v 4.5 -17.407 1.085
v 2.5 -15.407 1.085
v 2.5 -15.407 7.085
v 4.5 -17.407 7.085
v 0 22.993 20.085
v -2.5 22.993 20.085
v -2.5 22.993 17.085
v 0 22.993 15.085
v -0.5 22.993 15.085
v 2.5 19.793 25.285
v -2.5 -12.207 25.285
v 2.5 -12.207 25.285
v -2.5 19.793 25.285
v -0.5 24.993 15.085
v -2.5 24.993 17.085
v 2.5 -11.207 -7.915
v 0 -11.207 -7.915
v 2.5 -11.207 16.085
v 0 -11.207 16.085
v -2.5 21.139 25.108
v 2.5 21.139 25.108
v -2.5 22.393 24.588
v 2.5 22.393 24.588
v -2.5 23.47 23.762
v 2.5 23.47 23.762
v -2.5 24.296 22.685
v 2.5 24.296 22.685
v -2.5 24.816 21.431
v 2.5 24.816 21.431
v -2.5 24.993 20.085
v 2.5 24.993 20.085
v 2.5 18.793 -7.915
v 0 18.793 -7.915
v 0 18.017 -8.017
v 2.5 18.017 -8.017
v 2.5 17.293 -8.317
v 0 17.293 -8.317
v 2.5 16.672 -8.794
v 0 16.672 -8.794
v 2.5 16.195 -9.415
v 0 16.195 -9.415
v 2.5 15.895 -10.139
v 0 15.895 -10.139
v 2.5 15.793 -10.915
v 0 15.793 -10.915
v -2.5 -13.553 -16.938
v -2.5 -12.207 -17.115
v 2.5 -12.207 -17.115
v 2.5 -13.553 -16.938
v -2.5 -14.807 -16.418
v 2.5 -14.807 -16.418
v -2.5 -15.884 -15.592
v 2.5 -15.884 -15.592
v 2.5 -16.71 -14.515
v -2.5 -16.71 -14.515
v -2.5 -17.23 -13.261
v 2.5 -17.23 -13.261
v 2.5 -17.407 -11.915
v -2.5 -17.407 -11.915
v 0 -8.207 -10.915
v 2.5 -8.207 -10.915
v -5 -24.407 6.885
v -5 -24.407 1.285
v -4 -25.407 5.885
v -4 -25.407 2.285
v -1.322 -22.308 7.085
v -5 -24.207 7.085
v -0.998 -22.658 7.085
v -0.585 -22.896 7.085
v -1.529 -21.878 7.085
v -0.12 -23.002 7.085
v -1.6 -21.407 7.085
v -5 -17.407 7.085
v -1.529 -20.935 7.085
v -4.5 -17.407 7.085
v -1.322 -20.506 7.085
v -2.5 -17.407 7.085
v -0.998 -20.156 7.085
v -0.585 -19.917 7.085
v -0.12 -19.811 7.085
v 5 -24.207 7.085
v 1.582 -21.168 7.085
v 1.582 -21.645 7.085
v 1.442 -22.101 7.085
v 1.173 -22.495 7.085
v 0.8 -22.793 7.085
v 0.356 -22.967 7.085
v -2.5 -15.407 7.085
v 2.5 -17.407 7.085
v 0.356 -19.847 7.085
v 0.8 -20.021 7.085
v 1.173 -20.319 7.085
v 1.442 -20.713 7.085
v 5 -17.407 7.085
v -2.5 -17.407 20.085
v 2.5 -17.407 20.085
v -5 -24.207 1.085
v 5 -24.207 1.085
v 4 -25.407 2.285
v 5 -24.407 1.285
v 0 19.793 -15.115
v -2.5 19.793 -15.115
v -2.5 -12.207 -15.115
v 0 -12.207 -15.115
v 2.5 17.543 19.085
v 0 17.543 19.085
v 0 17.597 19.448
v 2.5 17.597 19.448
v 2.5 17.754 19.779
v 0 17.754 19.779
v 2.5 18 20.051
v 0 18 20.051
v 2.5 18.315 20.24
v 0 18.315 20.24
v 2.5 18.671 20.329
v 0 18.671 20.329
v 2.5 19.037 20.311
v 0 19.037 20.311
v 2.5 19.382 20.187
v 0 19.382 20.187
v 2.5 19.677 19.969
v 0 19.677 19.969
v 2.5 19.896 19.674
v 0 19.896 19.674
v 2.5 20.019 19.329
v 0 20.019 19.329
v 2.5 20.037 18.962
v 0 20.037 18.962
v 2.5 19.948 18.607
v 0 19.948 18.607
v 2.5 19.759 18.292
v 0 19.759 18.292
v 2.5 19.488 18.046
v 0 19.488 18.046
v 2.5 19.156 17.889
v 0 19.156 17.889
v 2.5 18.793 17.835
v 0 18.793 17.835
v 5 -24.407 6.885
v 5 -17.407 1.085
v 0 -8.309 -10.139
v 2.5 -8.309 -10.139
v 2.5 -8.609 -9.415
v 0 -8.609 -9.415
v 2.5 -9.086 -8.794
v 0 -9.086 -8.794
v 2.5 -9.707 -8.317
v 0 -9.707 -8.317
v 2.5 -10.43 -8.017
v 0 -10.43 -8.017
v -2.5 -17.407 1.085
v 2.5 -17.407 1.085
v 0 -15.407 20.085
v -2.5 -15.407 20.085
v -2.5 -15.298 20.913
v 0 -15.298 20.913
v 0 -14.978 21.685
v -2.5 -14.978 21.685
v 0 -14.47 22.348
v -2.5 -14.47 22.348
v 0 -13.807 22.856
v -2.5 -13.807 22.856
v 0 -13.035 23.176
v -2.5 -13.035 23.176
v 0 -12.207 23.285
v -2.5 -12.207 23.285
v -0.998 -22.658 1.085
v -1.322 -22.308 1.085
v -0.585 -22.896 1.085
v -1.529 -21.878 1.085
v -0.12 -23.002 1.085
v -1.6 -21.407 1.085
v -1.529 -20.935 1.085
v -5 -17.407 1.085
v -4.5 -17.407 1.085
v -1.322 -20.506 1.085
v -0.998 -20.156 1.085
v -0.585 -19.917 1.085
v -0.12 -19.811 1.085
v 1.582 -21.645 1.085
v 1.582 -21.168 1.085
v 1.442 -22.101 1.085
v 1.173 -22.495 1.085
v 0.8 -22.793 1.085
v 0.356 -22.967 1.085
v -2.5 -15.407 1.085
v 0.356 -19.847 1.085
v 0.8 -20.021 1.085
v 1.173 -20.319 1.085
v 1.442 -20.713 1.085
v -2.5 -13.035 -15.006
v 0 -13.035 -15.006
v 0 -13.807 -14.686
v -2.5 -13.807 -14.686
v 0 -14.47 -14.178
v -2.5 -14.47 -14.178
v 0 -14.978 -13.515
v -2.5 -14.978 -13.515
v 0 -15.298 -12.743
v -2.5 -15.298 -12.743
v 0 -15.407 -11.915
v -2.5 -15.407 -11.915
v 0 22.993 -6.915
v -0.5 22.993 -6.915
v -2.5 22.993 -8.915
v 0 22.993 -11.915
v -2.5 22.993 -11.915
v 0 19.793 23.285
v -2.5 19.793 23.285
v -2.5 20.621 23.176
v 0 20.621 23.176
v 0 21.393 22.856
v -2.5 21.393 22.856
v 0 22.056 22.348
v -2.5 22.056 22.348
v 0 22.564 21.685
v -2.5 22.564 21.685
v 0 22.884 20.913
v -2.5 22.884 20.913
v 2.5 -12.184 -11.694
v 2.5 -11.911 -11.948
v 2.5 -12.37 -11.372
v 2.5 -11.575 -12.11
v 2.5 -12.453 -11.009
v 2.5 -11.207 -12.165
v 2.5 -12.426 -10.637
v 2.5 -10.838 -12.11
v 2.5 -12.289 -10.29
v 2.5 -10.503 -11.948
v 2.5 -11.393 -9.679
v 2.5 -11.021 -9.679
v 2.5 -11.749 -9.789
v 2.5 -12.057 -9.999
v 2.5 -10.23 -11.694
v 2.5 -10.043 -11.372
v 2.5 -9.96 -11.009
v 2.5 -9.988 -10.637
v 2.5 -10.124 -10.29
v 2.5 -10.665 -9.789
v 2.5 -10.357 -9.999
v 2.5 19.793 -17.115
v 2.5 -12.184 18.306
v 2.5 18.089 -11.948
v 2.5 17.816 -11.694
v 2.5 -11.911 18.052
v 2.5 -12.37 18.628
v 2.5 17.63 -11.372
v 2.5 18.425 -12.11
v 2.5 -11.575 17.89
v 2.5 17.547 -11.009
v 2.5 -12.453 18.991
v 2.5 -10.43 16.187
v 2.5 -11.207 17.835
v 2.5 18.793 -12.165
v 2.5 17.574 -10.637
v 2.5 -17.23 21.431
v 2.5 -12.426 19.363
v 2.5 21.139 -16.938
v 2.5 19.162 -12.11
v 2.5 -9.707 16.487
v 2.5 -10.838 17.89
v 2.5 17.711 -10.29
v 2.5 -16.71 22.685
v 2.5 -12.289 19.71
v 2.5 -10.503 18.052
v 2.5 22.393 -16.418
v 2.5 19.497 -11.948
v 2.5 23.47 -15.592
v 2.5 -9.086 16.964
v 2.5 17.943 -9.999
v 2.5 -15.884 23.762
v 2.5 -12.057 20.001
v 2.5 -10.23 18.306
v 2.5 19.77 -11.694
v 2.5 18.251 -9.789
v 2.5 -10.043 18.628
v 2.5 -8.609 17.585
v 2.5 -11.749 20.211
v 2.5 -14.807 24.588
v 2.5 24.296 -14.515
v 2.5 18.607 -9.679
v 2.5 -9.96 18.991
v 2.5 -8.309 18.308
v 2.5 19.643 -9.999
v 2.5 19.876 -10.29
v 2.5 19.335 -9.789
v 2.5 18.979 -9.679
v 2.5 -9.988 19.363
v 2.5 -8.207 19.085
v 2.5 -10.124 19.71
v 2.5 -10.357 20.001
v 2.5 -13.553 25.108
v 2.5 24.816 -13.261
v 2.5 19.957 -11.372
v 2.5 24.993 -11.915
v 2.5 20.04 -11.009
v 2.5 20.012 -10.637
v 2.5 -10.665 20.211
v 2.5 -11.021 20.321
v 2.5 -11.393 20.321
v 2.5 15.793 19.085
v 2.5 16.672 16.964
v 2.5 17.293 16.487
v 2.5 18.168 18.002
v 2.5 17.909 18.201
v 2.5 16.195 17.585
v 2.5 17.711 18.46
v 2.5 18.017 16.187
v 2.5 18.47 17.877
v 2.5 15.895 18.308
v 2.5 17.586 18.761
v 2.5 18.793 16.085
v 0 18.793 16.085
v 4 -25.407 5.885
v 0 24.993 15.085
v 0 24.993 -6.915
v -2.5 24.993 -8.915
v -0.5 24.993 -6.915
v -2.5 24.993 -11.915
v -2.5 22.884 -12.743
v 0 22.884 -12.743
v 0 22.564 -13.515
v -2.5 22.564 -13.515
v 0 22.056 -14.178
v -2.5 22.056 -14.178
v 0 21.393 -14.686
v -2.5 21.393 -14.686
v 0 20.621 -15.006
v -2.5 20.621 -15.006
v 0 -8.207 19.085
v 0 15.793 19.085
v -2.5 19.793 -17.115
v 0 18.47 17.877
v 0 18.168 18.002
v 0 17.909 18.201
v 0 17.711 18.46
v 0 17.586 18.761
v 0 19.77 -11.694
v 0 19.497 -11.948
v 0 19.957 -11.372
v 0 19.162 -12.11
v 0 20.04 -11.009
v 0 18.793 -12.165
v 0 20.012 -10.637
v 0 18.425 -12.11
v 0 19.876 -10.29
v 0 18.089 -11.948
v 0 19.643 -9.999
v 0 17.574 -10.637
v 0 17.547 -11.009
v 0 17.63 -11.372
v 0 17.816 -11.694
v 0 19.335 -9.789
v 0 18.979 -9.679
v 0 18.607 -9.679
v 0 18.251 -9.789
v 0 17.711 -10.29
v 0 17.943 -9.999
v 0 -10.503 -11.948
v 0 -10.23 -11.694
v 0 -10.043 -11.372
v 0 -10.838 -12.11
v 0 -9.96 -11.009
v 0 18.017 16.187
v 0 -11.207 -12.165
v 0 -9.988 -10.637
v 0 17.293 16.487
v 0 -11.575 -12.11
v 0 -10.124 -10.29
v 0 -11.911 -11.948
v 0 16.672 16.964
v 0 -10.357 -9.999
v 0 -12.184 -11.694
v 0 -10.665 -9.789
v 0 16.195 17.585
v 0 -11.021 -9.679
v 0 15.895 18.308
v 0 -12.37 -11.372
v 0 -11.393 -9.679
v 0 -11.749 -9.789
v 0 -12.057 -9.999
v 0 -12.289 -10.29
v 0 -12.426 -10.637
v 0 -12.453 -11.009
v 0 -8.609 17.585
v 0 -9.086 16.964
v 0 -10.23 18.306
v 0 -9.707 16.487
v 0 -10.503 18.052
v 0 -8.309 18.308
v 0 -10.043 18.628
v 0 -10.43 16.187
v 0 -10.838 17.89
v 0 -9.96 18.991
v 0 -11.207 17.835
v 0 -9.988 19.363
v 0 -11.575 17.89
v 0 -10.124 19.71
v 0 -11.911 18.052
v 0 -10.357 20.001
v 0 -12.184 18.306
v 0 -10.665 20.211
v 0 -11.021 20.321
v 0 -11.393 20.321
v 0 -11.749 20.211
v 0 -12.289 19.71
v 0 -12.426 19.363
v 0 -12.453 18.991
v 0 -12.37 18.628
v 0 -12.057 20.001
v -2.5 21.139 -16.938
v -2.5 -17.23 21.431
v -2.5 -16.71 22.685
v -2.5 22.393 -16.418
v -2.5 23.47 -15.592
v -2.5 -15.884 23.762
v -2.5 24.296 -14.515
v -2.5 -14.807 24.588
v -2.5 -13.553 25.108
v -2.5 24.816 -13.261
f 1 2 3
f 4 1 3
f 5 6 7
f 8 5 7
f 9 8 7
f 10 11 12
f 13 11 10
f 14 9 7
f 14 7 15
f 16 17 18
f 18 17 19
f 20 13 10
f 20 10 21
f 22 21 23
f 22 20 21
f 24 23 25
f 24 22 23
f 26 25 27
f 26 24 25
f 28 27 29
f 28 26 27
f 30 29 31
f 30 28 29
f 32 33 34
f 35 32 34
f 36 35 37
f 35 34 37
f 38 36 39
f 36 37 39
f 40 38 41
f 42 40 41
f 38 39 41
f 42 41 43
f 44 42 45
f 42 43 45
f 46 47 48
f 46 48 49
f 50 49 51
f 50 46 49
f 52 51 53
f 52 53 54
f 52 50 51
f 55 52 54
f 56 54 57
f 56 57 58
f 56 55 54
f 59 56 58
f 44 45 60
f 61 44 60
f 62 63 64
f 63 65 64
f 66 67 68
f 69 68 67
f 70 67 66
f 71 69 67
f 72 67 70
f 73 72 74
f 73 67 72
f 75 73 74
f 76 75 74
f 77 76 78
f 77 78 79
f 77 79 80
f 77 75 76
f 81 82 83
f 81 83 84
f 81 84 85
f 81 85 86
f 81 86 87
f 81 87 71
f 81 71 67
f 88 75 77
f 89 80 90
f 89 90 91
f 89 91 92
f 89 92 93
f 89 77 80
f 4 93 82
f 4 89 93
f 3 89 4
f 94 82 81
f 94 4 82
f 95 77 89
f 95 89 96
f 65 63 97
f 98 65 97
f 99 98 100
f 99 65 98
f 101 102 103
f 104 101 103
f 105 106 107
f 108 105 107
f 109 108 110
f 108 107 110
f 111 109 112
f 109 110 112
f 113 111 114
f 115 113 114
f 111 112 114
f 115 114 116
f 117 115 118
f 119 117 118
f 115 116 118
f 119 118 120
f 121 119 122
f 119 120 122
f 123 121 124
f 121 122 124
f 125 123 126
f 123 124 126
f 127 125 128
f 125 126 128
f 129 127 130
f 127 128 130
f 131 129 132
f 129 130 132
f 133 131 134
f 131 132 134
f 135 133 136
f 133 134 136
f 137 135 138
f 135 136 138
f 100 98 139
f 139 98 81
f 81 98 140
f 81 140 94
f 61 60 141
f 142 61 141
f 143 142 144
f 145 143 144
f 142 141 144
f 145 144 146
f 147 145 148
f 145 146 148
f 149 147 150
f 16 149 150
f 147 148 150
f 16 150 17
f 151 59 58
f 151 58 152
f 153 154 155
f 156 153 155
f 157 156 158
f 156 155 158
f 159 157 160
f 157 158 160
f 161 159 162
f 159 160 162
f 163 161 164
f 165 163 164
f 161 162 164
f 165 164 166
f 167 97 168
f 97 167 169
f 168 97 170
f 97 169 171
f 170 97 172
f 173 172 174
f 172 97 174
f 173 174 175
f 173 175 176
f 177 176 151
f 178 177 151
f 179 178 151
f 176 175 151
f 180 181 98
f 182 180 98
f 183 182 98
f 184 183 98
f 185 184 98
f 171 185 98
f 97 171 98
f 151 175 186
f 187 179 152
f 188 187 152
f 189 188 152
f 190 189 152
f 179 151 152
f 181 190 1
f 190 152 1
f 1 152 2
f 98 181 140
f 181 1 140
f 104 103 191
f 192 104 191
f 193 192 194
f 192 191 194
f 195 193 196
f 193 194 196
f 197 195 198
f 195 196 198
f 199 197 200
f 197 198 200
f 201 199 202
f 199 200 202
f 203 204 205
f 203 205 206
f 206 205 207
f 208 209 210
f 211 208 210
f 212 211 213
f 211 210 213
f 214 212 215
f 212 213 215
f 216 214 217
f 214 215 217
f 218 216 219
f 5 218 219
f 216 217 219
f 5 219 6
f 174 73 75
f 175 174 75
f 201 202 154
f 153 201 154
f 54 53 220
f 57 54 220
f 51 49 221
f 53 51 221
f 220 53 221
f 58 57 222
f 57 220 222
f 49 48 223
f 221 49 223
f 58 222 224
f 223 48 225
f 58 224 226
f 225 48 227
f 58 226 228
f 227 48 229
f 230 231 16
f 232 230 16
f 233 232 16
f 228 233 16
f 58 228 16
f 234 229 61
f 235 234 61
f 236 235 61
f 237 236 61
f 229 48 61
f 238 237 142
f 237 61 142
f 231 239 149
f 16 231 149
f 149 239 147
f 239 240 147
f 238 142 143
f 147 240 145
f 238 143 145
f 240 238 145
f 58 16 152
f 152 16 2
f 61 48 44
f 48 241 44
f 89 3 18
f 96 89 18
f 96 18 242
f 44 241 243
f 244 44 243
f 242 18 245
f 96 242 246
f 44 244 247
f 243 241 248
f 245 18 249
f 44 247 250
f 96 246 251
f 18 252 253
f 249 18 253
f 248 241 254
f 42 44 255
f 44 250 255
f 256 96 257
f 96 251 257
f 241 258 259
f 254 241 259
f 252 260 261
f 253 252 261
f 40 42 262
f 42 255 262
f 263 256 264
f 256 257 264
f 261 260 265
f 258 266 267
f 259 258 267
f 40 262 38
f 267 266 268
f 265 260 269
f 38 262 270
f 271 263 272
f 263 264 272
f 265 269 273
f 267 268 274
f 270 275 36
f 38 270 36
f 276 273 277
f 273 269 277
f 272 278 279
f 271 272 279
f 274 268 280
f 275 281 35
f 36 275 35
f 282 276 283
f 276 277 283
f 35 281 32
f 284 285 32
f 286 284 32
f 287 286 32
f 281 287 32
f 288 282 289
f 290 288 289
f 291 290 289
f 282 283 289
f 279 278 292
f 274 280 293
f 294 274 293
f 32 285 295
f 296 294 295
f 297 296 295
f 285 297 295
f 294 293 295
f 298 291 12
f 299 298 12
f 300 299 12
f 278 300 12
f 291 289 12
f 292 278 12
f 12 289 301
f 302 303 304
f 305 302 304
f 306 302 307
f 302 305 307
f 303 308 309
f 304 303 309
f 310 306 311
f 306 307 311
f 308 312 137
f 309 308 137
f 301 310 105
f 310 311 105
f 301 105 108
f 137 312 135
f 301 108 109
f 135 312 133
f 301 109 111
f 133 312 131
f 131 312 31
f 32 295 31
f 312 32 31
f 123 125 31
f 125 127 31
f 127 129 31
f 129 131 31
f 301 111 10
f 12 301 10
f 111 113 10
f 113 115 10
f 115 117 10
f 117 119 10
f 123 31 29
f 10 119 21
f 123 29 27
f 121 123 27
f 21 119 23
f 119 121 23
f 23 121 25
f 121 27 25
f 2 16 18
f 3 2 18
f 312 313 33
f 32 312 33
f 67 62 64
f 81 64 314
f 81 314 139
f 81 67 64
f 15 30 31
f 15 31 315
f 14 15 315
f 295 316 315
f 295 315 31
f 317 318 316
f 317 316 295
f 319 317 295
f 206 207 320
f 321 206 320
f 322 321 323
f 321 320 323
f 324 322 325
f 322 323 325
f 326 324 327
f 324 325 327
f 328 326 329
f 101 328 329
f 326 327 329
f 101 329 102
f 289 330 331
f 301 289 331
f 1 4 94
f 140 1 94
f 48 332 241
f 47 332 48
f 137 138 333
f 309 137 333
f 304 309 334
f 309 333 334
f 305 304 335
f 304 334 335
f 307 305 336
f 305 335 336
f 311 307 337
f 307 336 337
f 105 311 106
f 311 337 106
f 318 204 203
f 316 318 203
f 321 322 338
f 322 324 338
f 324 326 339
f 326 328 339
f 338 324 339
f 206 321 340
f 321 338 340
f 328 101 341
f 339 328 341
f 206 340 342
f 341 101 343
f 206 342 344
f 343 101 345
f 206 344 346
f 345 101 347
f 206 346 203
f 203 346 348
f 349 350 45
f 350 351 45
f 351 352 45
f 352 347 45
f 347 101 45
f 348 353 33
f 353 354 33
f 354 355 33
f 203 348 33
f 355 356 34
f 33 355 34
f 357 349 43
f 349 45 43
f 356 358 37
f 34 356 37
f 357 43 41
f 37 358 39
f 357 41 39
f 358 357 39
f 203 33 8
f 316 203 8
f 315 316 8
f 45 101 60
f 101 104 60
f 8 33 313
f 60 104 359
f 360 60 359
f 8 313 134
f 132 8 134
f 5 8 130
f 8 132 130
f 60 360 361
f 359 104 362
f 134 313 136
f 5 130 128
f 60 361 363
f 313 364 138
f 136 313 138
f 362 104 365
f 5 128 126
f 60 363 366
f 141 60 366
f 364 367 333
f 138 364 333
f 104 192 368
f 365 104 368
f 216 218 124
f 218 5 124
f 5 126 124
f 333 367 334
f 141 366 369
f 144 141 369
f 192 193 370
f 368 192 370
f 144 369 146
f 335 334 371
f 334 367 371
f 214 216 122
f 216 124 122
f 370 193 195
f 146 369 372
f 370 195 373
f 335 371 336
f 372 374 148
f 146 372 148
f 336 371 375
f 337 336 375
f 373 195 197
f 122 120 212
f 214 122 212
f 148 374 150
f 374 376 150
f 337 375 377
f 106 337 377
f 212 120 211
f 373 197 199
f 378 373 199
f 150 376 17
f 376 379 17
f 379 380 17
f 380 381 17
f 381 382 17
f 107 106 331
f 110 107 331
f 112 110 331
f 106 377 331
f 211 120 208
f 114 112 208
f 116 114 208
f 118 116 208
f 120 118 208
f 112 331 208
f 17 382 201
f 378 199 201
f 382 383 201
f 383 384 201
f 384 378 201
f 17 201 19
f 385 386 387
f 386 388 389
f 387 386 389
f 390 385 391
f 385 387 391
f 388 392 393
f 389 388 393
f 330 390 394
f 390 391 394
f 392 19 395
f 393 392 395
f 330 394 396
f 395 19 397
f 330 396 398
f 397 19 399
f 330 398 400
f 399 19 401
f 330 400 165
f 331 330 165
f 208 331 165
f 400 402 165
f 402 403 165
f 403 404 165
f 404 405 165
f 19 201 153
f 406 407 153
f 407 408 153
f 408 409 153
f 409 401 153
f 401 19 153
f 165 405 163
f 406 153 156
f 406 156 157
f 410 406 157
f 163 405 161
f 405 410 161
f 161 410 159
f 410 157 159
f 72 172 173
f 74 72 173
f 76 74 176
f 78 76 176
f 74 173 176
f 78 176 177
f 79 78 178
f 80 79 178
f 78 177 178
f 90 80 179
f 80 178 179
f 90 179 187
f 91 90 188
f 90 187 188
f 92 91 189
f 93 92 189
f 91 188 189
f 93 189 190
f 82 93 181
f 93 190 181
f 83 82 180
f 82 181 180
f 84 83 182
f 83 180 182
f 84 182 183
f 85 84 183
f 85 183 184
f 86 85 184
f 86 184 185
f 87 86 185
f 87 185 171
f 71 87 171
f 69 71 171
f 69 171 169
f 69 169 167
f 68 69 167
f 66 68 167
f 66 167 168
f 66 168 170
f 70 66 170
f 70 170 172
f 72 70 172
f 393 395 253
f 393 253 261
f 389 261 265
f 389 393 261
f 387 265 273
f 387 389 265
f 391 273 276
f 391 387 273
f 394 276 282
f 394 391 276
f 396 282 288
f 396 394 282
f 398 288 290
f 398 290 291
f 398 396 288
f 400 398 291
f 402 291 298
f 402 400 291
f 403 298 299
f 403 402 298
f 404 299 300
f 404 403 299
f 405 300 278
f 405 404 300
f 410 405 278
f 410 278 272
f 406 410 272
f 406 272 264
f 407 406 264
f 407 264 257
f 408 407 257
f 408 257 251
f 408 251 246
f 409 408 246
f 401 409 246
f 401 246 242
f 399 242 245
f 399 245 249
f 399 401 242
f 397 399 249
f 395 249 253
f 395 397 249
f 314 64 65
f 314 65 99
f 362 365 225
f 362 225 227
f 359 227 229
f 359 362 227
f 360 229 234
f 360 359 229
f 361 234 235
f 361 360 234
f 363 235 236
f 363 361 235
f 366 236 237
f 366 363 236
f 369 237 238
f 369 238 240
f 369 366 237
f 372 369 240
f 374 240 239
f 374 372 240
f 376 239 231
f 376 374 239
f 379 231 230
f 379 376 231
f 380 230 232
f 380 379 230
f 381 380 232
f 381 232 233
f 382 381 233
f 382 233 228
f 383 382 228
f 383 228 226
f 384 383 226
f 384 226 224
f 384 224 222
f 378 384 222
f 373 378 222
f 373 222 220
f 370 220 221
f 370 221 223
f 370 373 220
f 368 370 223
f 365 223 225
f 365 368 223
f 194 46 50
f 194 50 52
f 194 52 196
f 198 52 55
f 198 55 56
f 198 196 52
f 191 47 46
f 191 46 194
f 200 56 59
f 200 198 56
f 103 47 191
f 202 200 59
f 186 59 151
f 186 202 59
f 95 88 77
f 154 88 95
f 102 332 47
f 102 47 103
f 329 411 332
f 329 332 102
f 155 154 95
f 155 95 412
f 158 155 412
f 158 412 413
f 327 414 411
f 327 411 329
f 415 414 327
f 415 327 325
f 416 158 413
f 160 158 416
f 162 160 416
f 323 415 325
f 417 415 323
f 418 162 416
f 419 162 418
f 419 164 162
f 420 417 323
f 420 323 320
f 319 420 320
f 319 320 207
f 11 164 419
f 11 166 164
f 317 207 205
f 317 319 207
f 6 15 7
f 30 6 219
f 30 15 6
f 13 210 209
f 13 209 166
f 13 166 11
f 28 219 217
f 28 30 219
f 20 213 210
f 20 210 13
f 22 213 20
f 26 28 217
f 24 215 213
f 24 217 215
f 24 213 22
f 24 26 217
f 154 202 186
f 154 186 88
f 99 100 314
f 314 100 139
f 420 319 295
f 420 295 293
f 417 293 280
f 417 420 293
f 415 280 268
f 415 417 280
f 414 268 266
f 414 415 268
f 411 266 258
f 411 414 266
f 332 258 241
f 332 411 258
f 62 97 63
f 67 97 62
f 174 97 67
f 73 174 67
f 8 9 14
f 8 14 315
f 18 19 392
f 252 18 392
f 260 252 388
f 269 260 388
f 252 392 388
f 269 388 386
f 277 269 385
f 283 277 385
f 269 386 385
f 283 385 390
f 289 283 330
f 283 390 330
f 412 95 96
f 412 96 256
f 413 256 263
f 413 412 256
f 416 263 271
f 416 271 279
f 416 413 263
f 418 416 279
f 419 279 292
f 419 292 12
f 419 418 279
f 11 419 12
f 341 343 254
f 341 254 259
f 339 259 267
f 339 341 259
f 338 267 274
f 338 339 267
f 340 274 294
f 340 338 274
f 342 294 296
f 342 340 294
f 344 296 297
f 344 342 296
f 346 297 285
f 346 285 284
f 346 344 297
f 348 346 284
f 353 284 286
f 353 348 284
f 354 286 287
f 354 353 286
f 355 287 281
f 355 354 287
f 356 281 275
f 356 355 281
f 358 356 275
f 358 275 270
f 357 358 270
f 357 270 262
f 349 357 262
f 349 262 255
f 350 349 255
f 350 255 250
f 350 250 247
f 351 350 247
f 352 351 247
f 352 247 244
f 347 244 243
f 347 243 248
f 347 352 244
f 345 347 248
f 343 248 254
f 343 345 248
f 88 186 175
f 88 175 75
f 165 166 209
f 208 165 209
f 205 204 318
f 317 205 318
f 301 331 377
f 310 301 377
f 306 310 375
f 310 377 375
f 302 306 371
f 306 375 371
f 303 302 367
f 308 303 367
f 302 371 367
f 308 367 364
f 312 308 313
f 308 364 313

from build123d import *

# Parameters (mm, degrees)
SKETCH1_R           = 1.25
BOSS_EXTRUDE1_DEPTH = 2.5
BOSS_EXTRUDE2_DEPTH = 2.5
BOSS_EXTRUDE4_START = 2.5
BOSS_EXTRUDE4_DEPTH = 2.5
SKETCH5_W           = 10
SKETCH5_H           = 6
BOSS_EXTRUDE6_DEPTH = 8
CHAMFER1_SIZE       = 2
SKETCH6_R           = 1.6
CUT_EXTRUDE1_DEPTH  = 8
CHAMFER2_SIZE       = 1
CHAMFER3_SIZE       = 1.2
SKETCH7_W           = 2.5
SKETCH7_H           = 22
CUT_EXTRUDE2_DEPTH  = 55.835083878
CHAMFER4_SIZE       = 2


with BuildPart() as part:
    # Sketch1 → Boss-Extrude1 (new body)
    with BuildSketch(Plane(origin=(0, 0, 0), x_dir=(0, 0, -1), z_dir=(1, 0, 0))):
        with BuildLine():
            ThreePointArc((-20.08490506, 22.793126127), (-22.206225403, 21.914446471), (-23.08490506, 19.793126127))
            Line((-23.08490506, 19.793126127), (-23.08490506, -12.206873873))
            ThreePointArc((-23.08490506, -12.206873873), (-22.206225403, -14.328194216), (-20.08490506, -15.206873873))
            Line((-20.08490506, -15.206873873), (11.91509494, -15.206873873))
            ThreePointArc((11.91509494, -15.206873873), (14.036415284, -14.328194216), (14.91509494, -12.206873873))
            Line((14.91509494, -12.206873873), (14.91509494, 19.793126127))
            ThreePointArc((14.91509494, 19.793126127), (14.036415284, 21.914446471), (11.91509494, 22.793126127))
            Line((11.91509494, 22.793126127), (-20.08490506, 22.793126127))
        make_face()
        with Locations((-19.08490506, -11.206873873)):
            Circle(SKETCH1_R, mode=Mode.SUBTRACT)
        with Locations((10.91509494, -11.206873873)):
            Circle(SKETCH1_R, mode=Mode.SUBTRACT)
        with BuildLine():
            ThreePointArc((-19.08490506, 17.543126127), (-19.968788536, 19.677009604), (-17.83490506, 18.793126127))
            ThreePointArc((-17.83490506, 18.793126127), (-18.201021583, 17.909242651), (-19.08490506, 17.543126127))
        make_face(mode=Mode.SUBTRACT)
        with BuildLine():
            Line((-19.08490506, -8.206873873), (-19.08490506, 15.793126127))
            ThreePointArc((-19.08490506, 15.793126127), (-16.963584716, 16.671805784), (-16.08490506, 18.793126127))
            Line((-16.08490506, 18.793126127), (7.91509494, 18.793126127))
            ThreePointArc((7.91509494, 18.793126127), (8.793774597, 16.671805784), (10.91509494, 15.793126127))
            Line((10.91509494, 15.793126127), (10.91509494, -8.206873873))
            ThreePointArc((10.91509494, -8.206873873), (8.793774597, -9.085553529), (7.91509494, -11.206873873))
            Line((7.91509494, -11.206873873), (-16.08490506, -11.206873873))
            ThreePointArc((-16.08490506, -11.206873873), (-16.963584716, -9.085553529), (-19.08490506, -8.206873873))
        make_face(mode=Mode.SUBTRACT)
        with Locations((10.91509494, 18.793126127)):
            Circle(SKETCH1_R, mode=Mode.SUBTRACT)
    extrude(amount=BOSS_EXTRUDE1_DEPTH)

    # Sketch2 → Boss-Extrude2 (add)
    with BuildSketch(Plane.ZY):
        with BuildLine():
            Line((-17.11509494, 19.793126127), (-17.11509494, -12.206873873))
            ThreePointArc((-17.11509494, -12.206873873), (-15.592050202, -15.883829135), (-11.91509494, -17.406873873))
            Line((-11.91509494, -17.406873873), (20.08490506, -17.406873873))
            ThreePointArc((20.08490506, -17.406873873), (23.761860322, -15.883829135), (25.28490506, -12.206873873))
            Line((25.28490506, -12.206873873), (25.28490506, 19.793126127))
            ThreePointArc((25.28490506, 19.793126127), (23.761860322, 23.470081389), (20.08490506, 24.993126127))
            Line((20.08490506, 24.993126127), (-11.91509494, 24.993126127))
            ThreePointArc((-11.91509494, 24.993126127), (-15.592050202, 23.470081389), (-17.11509494, 19.793126127))
        make_face()
        with BuildLine():
            Line((-14.91509494, 19.793126127), (-14.91509494, -12.206873873))
            ThreePointArc((-14.91509494, -12.206873873), (-14.036415284, -14.328194216), (-11.91509494, -15.206873873))
            Line((-11.91509494, -15.206873873), (20.08490506, -15.206873873))
            ThreePointArc((20.08490506, -15.206873873), (22.206225403, -14.328194216), (23.08490506, -12.206873873))
            Line((23.08490506, -12.206873873), (23.08490506, 19.793126127))
            ThreePointArc((23.08490506, 19.793126127), (22.206225403, 21.914446471), (20.08490506, 22.793126127))
            Line((20.08490506, 22.793126127), (-11.91509494, 22.793126127))
            ThreePointArc((-11.91509494, 22.793126127), (-14.036415284, 21.914446471), (-14.91509494, 19.793126127))
        make_face(mode=Mode.SUBTRACT)
    extrude(amount=-BOSS_EXTRUDE2_DEPTH)

    # Sketch3 → Boss-Extrude4 (add)
    with BuildSketch(Plane.ZY.offset(BOSS_EXTRUDE4_START)):
        with BuildLine():
            Line((-17.11509494, 19.793126127), (-17.11509494, -12.206873873))
            ThreePointArc((-17.11509494, -12.206873873), (-15.592050202, -15.883829135), (-11.91509494, -17.406873873))
            Line((-11.91509494, -17.406873873), (20.08490506, -17.406873873))
            ThreePointArc((20.08490506, -17.406873873), (23.761860322, -15.883829135), (25.28490506, -12.206873873))
            Line((25.28490506, -12.206873873), (25.28490506, 19.793126127))
            ThreePointArc((25.28490506, 19.793126127), (23.761860322, 23.470081389), (20.08490506, 24.993126127))
            Line((20.08490506, 24.993126127), (-11.91509494, 24.993126127))
            ThreePointArc((-11.91509494, 24.993126127), (-15.592050202, 23.470081389), (-17.11509494, 19.793126127))
        make_face()
        with BuildLine():
            Line((-15.11509494, 19.793126127), (-15.11509494, -12.206873873))
            ThreePointArc((-15.11509494, -12.206873873), (-14.17783664, -14.469615573), (-11.91509494, -15.406873873))
            Line((-11.91509494, -15.406873873), (20.08490506, -15.406873873))
            ThreePointArc((20.08490506, -15.406873873), (22.34764676, -14.469615573), (23.28490506, -12.206873873))
            Line((23.28490506, -12.206873873), (23.28490506, 19.793126127))
            ThreePointArc((23.28490506, 19.793126127), (22.34764676, 22.055867827), (20.08490506, 22.993126127))
            Line((20.08490506, 22.993126127), (-11.91509494, 22.993126127))
            ThreePointArc((-11.91509494, 22.993126127), (-14.17783664, 22.055867827), (-15.11509494, 19.793126127))
        make_face(mode=Mode.SUBTRACT)
    extrude(amount=-BOSS_EXTRUDE4_DEPTH)

    # Sketch5 → Boss-Extrude6 (add)
    with BuildSketch(Plane.XZ.offset(17.406873873)):
        with Locations((0, 4.08490506)):
            Rectangle(SKETCH5_W, SKETCH5_H)
    extrude(amount=BOSS_EXTRUDE6_DEPTH)

    # Chamfer1
    chamfer1_edges = [part.edges().sort_by_distance(p)[0] for p in [
        (-2.5, -17.406873873, 4.08490506),
        (2.5, -17.406873873, 4.08490506),
    ]]
    chamfer(chamfer1_edges, length=CHAMFER1_SIZE - 0.0001)  # a hair under: the kernel refuses the full size

    # Sketch6 → Cut-Extrude1 (cut)
    with BuildSketch(Plane(origin=(0, 0, 1.08490506), x_dir=(-1, 0, 0), z_dir=(0, 0, -1))):
        with Locations((0, -21.406873873)):
            Circle(SKETCH6_R)
    extrude(amount=-CUT_EXTRUDE1_DEPTH, mode=Mode.SUBTRACT)

    # Chamfer2
    chamfer2_edges = [part.edges().sort_by_distance(p)[0] for p in [
        (-5, -25.406873873, 4.08490506),
        (5, -25.406873873, 4.08490506),
    ]]
    chamfer(chamfer2_edges, length=CHAMFER2_SIZE)

    # Chamfer3
    chamfer3_edges = [part.edges().sort_by_distance(p)[0] for p in [
        (0, -25.406873873, 1.08490506),
        (0, -25.406873873, 7.08490506),
    ]]
    chamfer(chamfer3_edges, length=CHAMFER3_SIZE)

    # Sketch7 → Cut-Extrude2 (cut, through all)
    with BuildSketch(Plane.XZ.offset(-22.993126127)):
        with Locations((-1.25, 4.08490506)):
            Rectangle(SKETCH7_W, SKETCH7_H)
    extrude(amount=-CUT_EXTRUDE2_DEPTH, mode=Mode.SUBTRACT)

    # Chamfer4
    chamfer4_edges = [part.edges().sort_by_distance(p)[0] for p in [
        (-2.5, 23.993126127, -6.91509494),
        (-2.5, 23.993126127, 15.08490506),
    ]]
    chamfer(chamfer4_edges, length=CHAMFER4_SIZE)


solid = part.part
